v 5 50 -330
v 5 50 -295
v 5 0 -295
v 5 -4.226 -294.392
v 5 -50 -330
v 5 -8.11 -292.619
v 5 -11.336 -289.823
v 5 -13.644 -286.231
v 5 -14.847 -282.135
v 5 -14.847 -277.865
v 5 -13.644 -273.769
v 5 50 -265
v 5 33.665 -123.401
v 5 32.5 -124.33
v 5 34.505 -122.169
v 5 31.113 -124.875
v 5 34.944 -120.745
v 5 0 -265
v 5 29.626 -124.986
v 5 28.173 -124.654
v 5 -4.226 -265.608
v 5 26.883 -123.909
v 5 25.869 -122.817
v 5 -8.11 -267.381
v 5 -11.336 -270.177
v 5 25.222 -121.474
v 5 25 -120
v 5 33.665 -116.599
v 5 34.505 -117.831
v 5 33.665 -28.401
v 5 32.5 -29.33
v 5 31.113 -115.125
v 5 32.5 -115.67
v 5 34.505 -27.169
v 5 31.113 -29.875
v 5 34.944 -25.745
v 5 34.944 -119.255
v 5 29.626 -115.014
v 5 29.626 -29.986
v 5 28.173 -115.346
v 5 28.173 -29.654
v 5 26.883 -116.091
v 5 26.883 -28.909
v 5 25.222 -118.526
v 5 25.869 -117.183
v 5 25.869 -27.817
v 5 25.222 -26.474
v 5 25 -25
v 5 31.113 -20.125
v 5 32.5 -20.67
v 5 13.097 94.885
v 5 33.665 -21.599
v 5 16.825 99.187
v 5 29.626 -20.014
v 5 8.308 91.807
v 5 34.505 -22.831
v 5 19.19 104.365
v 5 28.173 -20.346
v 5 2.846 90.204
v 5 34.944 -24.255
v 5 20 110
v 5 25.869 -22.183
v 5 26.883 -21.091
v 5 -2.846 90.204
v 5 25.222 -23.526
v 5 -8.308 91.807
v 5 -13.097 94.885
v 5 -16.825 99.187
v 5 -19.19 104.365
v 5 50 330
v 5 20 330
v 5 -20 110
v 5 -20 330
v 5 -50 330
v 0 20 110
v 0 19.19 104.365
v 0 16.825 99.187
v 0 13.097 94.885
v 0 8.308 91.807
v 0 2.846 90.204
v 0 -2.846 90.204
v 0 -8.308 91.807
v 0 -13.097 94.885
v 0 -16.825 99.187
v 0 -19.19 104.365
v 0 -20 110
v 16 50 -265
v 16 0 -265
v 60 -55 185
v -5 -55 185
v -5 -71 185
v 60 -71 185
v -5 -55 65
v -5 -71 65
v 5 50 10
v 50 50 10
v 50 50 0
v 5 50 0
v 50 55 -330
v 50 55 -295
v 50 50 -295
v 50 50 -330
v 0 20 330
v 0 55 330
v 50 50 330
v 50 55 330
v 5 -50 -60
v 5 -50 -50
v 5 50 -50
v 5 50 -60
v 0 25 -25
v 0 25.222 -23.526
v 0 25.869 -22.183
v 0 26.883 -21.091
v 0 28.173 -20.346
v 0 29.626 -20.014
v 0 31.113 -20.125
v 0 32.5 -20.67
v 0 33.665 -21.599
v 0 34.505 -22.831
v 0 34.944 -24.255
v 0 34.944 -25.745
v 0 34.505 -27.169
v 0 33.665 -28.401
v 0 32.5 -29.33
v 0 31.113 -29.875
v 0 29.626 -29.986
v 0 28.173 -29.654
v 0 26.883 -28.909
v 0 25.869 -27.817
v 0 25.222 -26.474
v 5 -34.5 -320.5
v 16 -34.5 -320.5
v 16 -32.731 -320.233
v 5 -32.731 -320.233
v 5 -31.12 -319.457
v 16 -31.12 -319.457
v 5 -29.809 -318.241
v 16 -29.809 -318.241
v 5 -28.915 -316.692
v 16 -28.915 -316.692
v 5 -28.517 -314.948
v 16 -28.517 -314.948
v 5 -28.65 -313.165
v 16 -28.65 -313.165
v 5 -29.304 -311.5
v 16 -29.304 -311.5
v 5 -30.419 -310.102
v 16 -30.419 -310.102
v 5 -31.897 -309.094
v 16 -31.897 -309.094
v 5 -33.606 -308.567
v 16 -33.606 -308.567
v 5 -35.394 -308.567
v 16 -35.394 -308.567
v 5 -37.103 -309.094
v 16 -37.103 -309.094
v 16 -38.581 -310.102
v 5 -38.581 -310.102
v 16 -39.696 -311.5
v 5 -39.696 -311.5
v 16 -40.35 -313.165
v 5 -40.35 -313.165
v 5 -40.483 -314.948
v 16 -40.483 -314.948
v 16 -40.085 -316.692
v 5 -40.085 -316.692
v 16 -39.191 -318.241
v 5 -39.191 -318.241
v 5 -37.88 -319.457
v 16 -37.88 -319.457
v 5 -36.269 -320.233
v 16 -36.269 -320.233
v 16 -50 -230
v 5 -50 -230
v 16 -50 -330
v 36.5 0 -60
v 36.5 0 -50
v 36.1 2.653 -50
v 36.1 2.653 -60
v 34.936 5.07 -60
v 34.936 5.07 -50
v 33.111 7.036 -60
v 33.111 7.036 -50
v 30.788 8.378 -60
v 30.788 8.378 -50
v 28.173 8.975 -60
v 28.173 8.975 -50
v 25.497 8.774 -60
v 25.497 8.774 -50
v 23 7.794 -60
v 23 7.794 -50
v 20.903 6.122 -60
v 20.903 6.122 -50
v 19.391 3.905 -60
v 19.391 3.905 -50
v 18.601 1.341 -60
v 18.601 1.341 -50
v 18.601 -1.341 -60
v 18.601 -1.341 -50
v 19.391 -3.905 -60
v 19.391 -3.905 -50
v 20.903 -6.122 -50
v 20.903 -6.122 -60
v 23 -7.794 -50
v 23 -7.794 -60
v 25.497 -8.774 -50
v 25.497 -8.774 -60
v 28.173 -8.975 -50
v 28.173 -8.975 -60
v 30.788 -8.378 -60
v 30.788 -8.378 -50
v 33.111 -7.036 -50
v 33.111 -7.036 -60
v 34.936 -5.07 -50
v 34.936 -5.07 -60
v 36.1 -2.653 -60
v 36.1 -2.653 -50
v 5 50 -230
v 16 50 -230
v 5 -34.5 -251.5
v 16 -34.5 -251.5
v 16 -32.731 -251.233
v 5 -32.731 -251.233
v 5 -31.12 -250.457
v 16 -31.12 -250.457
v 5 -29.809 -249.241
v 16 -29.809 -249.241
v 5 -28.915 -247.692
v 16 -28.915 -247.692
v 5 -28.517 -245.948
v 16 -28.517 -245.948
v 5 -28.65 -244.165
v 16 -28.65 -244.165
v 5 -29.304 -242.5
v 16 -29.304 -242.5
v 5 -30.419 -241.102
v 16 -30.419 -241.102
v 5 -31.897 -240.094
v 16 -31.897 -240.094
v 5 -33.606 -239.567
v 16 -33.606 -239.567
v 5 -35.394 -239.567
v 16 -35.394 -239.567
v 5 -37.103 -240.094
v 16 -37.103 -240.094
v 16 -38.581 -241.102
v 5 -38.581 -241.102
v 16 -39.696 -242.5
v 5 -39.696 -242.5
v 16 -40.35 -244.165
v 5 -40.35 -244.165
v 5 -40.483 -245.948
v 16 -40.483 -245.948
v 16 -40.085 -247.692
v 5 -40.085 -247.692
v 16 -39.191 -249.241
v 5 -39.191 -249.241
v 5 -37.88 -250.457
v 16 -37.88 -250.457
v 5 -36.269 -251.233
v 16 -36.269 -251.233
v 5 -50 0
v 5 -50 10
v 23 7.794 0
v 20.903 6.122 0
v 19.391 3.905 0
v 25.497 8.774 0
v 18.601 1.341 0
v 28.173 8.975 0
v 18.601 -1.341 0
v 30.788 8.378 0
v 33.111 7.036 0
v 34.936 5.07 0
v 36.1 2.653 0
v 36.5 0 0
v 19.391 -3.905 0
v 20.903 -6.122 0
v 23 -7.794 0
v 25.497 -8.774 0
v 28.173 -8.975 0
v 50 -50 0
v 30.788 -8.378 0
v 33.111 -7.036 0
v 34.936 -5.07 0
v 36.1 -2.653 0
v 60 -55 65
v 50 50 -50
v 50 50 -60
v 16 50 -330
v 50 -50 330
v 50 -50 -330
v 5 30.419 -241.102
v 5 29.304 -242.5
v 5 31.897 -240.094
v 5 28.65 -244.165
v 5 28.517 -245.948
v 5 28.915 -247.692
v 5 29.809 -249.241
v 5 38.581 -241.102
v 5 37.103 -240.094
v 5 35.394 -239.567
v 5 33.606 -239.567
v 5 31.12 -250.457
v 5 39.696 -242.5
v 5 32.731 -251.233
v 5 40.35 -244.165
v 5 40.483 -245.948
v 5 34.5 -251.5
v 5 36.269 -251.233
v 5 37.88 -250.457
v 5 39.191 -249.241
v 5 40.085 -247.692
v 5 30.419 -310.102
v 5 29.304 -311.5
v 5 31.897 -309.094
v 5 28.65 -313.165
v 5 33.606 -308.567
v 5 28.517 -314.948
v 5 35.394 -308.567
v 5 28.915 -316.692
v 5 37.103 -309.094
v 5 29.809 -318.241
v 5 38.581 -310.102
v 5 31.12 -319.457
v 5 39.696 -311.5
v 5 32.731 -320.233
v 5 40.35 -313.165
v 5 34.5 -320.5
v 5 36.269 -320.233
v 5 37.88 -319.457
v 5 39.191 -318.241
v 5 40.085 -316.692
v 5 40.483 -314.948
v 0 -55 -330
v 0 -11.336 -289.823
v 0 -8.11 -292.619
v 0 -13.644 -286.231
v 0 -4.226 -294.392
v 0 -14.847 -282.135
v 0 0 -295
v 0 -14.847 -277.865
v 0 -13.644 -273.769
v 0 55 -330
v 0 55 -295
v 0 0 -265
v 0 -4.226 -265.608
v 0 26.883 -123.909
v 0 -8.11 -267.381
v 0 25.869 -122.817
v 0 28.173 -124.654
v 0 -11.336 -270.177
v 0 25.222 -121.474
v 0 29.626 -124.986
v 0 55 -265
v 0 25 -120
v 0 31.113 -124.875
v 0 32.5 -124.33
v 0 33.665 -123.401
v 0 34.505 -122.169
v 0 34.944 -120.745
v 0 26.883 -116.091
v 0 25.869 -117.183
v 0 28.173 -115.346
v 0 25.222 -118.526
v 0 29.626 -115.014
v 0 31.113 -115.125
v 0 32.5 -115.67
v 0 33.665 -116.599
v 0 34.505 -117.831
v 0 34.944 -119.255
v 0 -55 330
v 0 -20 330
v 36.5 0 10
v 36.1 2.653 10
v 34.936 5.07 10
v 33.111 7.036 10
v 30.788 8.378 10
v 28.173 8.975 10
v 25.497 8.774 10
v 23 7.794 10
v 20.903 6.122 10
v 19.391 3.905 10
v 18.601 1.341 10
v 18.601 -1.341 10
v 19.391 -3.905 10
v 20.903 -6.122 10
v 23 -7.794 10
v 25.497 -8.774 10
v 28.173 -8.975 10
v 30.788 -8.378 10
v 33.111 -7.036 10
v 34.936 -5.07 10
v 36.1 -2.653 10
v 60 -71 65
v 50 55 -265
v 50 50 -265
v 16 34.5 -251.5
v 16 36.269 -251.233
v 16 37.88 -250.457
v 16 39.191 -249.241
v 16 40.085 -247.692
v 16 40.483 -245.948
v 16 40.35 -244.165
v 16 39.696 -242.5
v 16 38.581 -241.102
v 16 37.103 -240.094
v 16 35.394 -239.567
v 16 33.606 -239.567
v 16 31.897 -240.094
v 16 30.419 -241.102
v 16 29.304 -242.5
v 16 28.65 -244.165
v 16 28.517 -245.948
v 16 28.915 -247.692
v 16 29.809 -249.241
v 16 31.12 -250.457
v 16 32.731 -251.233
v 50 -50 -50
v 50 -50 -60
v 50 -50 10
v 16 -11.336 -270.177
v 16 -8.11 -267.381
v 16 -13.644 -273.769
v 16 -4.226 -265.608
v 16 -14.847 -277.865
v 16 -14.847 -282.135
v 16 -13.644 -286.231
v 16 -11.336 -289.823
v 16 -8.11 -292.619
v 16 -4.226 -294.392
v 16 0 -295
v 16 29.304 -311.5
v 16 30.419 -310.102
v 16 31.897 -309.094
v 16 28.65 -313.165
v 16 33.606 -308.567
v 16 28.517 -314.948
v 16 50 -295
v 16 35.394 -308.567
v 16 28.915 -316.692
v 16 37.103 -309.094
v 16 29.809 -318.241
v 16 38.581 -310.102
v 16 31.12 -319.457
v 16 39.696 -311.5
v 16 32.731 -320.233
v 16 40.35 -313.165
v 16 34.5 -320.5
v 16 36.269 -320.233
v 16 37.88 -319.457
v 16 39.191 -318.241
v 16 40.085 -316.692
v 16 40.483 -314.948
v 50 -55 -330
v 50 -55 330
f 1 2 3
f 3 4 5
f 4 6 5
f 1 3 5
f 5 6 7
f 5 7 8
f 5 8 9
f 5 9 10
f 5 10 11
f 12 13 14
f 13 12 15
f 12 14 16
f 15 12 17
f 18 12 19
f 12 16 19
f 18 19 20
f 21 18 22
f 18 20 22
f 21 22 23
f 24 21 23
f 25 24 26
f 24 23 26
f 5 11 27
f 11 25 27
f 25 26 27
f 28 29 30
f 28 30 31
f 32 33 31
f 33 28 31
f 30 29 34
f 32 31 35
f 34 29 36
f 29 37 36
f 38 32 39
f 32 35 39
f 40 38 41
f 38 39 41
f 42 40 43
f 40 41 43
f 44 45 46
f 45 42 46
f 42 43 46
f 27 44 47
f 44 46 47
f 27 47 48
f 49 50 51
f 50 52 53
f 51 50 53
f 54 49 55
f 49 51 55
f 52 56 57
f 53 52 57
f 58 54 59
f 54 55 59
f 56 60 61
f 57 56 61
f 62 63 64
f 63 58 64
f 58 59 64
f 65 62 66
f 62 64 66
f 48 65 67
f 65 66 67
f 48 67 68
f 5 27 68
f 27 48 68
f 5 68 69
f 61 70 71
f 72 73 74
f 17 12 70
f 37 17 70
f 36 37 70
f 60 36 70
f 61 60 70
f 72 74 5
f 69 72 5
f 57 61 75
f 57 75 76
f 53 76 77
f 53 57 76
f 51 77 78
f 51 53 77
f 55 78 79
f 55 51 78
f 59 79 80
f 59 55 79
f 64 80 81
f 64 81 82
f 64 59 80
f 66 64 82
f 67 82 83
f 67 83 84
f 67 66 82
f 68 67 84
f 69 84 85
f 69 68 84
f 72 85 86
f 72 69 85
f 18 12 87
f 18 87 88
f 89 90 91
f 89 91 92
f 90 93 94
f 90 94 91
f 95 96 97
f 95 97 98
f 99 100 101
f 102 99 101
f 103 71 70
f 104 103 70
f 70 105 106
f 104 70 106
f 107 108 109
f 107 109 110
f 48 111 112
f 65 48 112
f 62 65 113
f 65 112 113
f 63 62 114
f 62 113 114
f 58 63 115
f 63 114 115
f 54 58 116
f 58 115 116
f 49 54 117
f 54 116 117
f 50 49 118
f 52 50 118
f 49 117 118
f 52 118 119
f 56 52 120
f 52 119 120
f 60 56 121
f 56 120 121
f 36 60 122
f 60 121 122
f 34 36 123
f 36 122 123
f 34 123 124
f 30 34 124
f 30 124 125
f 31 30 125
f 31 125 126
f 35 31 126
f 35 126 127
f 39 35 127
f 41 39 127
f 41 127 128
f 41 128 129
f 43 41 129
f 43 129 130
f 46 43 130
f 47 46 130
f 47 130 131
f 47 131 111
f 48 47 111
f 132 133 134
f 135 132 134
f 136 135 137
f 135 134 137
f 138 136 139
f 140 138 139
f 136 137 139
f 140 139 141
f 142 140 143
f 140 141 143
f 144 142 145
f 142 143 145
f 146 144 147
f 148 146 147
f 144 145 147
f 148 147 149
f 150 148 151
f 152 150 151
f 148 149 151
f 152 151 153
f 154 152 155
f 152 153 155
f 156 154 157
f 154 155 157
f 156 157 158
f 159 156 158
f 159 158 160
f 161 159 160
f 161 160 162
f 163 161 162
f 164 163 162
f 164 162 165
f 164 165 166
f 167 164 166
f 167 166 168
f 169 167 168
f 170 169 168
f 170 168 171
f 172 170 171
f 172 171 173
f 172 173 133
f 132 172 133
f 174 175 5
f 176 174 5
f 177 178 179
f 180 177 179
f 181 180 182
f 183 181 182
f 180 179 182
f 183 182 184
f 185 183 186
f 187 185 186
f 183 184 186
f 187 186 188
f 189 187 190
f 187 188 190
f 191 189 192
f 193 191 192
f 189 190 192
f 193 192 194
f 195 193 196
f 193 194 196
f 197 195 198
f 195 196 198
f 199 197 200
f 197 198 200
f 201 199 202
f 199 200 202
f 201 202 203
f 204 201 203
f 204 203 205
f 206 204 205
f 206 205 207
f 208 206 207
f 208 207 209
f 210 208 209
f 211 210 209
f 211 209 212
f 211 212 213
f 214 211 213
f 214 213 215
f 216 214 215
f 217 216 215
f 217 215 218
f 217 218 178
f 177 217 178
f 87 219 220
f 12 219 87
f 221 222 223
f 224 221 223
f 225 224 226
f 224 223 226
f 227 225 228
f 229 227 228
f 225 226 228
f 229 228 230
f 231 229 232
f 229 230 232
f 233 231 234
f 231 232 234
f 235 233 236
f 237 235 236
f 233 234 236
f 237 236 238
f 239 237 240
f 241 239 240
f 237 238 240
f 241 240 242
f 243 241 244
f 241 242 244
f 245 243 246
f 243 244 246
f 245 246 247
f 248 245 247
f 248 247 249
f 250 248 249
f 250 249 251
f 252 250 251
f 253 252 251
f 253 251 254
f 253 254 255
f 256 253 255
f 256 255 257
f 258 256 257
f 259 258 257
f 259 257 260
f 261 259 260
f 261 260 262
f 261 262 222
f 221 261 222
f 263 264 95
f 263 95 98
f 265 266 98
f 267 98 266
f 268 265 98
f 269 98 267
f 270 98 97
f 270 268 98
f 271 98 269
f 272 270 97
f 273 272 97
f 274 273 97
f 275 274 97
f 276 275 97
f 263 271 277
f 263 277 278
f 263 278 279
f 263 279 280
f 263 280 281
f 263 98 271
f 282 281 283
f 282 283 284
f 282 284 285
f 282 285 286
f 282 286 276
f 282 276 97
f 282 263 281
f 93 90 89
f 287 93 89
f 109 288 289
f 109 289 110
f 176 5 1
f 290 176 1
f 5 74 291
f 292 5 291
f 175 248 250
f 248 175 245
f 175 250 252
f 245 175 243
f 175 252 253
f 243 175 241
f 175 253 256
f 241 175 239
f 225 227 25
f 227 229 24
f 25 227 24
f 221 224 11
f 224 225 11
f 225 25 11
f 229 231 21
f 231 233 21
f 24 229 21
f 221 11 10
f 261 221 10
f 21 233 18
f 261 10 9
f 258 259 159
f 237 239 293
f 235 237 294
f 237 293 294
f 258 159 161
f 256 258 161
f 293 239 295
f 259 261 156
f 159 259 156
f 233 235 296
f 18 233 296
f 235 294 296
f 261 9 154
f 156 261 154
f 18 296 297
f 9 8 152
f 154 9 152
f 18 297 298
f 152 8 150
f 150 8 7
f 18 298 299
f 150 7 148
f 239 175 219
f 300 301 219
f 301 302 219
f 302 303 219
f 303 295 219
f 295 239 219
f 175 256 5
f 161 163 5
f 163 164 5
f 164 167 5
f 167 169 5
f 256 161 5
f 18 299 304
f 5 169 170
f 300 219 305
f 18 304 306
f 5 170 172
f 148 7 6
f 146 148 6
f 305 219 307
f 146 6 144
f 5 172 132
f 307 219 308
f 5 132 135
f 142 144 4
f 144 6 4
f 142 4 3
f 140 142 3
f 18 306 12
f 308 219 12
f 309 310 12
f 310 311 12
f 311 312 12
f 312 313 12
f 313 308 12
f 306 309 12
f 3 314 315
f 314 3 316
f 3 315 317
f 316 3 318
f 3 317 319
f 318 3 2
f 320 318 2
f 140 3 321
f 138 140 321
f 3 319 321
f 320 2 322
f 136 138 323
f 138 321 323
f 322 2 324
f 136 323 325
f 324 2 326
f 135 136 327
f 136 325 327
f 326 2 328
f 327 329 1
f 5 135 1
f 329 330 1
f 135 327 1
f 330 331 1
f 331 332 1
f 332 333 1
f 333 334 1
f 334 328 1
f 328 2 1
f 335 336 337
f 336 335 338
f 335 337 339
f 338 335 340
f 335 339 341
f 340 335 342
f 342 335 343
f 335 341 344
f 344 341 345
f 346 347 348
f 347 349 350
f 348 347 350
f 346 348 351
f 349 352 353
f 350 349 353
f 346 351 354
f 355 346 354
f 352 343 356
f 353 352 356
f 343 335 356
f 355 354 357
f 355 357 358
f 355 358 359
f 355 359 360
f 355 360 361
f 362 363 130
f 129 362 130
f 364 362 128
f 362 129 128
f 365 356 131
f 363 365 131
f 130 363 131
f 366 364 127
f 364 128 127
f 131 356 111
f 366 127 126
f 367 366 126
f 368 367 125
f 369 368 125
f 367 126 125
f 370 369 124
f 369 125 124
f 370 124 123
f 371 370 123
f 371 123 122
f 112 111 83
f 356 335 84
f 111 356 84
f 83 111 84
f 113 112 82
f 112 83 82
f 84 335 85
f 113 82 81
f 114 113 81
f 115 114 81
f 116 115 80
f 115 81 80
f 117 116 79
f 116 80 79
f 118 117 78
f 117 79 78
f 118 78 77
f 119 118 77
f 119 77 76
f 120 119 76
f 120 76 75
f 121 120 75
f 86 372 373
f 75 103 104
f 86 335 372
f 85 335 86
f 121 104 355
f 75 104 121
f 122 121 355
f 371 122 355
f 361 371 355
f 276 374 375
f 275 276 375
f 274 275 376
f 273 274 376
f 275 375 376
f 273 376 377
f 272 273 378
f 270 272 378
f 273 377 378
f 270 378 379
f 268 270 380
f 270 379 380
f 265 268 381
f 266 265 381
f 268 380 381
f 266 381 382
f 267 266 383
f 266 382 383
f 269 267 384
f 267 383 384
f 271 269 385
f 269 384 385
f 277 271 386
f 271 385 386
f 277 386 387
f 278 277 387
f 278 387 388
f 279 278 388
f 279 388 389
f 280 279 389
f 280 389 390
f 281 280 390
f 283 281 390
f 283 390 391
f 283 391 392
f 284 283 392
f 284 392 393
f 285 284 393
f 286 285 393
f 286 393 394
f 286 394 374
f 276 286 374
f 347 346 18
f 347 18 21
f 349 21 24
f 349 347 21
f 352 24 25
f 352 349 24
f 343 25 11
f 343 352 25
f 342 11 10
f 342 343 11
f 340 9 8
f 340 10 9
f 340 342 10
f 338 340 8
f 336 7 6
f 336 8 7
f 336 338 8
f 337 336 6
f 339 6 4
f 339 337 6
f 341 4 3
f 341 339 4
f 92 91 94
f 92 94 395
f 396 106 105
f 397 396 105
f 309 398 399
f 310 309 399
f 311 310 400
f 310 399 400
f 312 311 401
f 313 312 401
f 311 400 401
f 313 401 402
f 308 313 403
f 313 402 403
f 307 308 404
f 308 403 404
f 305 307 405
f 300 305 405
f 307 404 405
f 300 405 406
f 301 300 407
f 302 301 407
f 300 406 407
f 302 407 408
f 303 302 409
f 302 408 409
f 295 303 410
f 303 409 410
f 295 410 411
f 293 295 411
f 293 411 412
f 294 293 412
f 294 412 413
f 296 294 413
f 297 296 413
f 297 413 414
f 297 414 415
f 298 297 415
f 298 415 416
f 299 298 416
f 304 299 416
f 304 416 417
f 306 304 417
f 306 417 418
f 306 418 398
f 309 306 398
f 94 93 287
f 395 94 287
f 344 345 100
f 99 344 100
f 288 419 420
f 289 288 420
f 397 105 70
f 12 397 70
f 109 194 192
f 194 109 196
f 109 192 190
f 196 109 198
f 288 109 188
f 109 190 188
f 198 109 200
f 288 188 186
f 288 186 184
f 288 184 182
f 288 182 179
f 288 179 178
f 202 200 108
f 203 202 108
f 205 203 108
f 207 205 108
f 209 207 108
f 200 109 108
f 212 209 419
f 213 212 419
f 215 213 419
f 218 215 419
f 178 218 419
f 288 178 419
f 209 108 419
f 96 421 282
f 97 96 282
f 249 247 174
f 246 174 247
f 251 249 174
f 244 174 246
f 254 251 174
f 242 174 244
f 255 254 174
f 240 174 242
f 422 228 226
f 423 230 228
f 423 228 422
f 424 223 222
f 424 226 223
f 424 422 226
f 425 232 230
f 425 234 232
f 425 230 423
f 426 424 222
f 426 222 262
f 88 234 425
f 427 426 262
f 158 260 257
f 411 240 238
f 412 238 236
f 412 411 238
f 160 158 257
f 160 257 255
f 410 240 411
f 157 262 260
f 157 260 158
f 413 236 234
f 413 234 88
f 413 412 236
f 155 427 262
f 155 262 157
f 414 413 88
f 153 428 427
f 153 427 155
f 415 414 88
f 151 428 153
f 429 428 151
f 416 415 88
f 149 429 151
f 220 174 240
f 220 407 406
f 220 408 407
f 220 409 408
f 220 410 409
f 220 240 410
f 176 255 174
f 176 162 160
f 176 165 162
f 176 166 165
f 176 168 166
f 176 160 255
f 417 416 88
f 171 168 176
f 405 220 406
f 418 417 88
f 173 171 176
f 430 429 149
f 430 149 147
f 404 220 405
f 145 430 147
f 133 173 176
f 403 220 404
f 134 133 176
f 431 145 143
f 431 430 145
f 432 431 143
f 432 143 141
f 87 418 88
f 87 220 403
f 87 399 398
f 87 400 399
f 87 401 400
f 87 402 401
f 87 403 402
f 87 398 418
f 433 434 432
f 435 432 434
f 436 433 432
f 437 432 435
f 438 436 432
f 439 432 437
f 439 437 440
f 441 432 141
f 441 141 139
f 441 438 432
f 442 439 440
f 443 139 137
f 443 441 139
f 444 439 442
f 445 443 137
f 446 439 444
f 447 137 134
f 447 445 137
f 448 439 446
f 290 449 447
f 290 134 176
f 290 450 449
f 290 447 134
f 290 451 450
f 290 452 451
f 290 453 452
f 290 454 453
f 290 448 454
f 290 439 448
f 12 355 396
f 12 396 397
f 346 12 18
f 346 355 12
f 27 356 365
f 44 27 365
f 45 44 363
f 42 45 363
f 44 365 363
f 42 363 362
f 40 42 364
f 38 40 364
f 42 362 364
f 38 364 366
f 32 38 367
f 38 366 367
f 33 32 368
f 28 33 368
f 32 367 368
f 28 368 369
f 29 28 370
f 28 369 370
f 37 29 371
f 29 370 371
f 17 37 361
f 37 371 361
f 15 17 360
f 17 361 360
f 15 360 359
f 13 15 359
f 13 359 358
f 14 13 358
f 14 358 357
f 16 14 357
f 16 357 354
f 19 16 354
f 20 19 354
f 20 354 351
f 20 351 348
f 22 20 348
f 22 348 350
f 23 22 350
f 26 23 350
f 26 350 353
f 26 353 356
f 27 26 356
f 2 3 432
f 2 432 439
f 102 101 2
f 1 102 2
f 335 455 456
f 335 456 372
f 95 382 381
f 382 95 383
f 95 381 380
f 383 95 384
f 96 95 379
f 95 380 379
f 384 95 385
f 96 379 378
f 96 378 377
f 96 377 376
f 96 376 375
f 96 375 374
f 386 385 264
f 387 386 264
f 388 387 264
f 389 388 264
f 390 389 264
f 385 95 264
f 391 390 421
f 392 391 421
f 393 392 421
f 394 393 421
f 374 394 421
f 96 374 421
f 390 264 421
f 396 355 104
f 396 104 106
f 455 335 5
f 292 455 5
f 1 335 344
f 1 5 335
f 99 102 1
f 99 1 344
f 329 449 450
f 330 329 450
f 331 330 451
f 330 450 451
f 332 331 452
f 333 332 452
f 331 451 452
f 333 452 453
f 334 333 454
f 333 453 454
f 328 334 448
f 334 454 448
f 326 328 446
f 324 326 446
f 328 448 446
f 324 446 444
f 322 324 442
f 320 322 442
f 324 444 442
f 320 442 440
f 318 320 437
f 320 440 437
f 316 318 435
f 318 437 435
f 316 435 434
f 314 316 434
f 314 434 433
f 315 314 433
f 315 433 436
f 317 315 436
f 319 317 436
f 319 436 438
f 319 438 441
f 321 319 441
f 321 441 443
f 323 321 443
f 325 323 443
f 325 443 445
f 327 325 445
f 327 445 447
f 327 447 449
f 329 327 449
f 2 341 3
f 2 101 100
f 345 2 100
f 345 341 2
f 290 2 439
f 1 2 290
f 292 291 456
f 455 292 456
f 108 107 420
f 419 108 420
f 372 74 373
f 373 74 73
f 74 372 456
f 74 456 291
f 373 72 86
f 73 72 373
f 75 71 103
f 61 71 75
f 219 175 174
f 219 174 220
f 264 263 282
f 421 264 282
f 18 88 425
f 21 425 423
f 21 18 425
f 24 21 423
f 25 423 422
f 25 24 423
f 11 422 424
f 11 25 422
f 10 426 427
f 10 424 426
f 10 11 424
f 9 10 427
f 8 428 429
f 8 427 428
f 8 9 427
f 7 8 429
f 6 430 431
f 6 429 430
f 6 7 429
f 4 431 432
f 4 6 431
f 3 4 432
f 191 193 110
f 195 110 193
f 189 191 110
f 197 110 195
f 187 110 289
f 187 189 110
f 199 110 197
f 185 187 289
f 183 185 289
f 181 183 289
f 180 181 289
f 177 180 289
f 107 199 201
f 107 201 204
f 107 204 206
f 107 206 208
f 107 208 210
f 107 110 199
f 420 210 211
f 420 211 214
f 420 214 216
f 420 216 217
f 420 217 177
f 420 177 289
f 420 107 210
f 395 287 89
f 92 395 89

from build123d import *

# Parameters (mm, degrees)
C_CHANNEL_100_X_10_1_DEPTH = 660
BOSS_EXTRUDE1_REACH        = 351.893
SKETCH12_W                 = 45
SKETCH12_H                 = 10
CUT_EXTRUDE1_DEPTH         = 5
SKETCH17_W                 = 100
SKETCH17_H                 = 100
BOSS_EXTRUDE3_DEPTH        = 11
SKETCH15_W                 = 65
SKETCH15_H                 = 120
BOSS_EXTRUDE2_DEPTH        = 16
CUT_EXTRUDE2_DEPTH         = 343.002923964
CUT_EXTRUDE2_DEPTH_BACK    = 343.002923964
SKETCH19_R                 = 6
CUT_EXTRUDE4_DEPTH         = 25
SKETCH20_R                 = 5
CUT_EXTRUDE5_DEPTH         = 343.84252945
CUT_EXTRUDE7_REACH         = 354.478
SKETCH22_R                 = 9


with BuildPart() as part:
    # Sketch11 → C channel 100 X 10(1) (new body)
    with BuildSketch(Plane.YX.offset(-330)):
        Polygon((-55, 0), (55, 0), (55, 50), (50, 50), (50, 5), (-50, 5), (-50, 50), (-55, 50), align=None)
    extrude(amount=C_CHANNEL_100_X_10_1_DEPTH)


with BuildPart() as body_2:

    # Sketch12 → Boss-Extrude1 (new, up to next)
    with BuildSketch(Plane(origin=(0, -50, 0), x_dir=(1, 0, 0), z_dir=(0, 1, 0)), mode=Mode.PRIVATE) as boss_extrude1_sk1:
        with Locations((27.5, -5)):
            Rectangle(SKETCH12_W, SKETCH12_H)
    boss_extrude1_tool1 = extrude(boss_extrude1_sk1.sketch, amount=BOSS_EXTRUDE1_REACH, mode=Mode.PRIVATE) - part.part
    # Sketch12 → Boss-Extrude1 (new, up to next)
    with BuildSketch(Plane(origin=(0, -50, 0), x_dir=(1, 0, 0), z_dir=(0, 1, 0)), mode=Mode.PRIVATE) as boss_extrude1_sk2:
        with Locations((27.5, 55)):
            Rectangle(SKETCH12_W, SKETCH12_H)
    boss_extrude1_tool2 = extrude(boss_extrude1_sk2.sketch, amount=BOSS_EXTRUDE1_REACH, mode=Mode.PRIVATE) - part.part
    add(boss_extrude1_tool1.solids().sort_by_distance((27.5, -50, 5))[0])
    add(boss_extrude1_tool2.solids().sort_by_distance((27.5, -50, -55))[0])

    # Cut-Extrude7: up to this face of the body (flat: up to its plane)
    cut_extrude7_end = Plane(body_2.part.faces().sort_by_distance((27.5, 0, -60))[0])
    # Sketch22 → Cut-Extrude7 (cut, up to the picked face)
    with BuildSketch(Plane.XY.offset(10), mode=Mode.PRIVATE) as cut_extrude7_sk1:
        with Locations((27.5, 0)):
            Circle(SKETCH22_R)
    cut_extrude7_tool1 = split(extrude(cut_extrude7_sk1.sketch, amount=-CUT_EXTRUDE7_REACH, mode=Mode.PRIVATE), bisect_by=cut_extrude7_end, keep=Keep.BOTH, mode=Mode.PRIVATE)
    add(cut_extrude7_tool1.solids().sort_by(Axis((27.5, 0, 10), (0, 0, -1)))[0], mode=Mode.SUBTRACT)


with BuildPart() as part_1:
    add(part.part)

    # Sketch13 → Cut-Extrude1 (cut)
    with BuildSketch(Plane(origin=(5, 0, 0), x_dir=(0, 0, -1), z_dir=(1, 0, 0))):
        with BuildLine():
            Line((-330, 20), (-110, 20))
            ThreePointArc((-110, 20), (-90, 0), (-110, -20))
            Line((-110, -20), (-330, -20))
            Line((-330, -20), (-330, 20))
        make_face()
    extrude(amount=-CUT_EXTRUDE1_DEPTH, mode=Mode.SUBTRACT)


with BuildPart() as body_3:
    # Sketch17 → Boss-Extrude3 (new body)
    with BuildSketch(Plane(origin=(5, 0, 0), x_dir=(0, 0, -1), z_dir=(1, 0, 0))):
        with Locations((280, 0)):
            Rectangle(SKETCH17_W, SKETCH17_H)
    extrude(amount=BOSS_EXTRUDE3_DEPTH)


with BuildPart() as body_4:
    # Sketch15 → Boss-Extrude2 (new body)
    with BuildSketch(Plane.XZ.offset(55)):
        with Locations((27.5, 125)):
            Rectangle(SKETCH15_W, SKETCH15_H)
    extrude(amount=BOSS_EXTRUDE2_DEPTH)


with BuildPart() as cut_extrude2_tool:
    # Sketch14 → Cut-Extrude2 (new, two sides: drawn at the far end of the back side and taken through both)
    with BuildSketch(Plane(origin=(5, 0, 0), x_dir=(0, 0, -1), z_dir=(1, 0, 0)).offset(-CUT_EXTRUDE2_DEPTH_BACK)):
        with BuildLine():
            Line((265, 55), (265, 0))
            ThreePointArc((265, 0), (280, -15), (295, 0))
            Line((295, 0), (295, 55))
            Line((295, 55), (265, 55))
        make_face()
    extrude(amount=CUT_EXTRUDE2_DEPTH + CUT_EXTRUDE2_DEPTH_BACK)


with BuildPart() as part_2:
    add(part_1.part)

    # Cut-Extrude2: cut by cut_extrude2_tool
    add(cut_extrude2_tool.part, mode=Mode.SUBTRACT)

    # Sketch20 → Cut-Extrude5 (cut, through all)
    with BuildSketch(Plane.ZY):
        with Locations(Location((-25, 30, 0), (0, 0, 270))):
            Circle(SKETCH20_R)
        with Locations(Location((-120, 30, 0), (0, 0, 270))):
            Circle(SKETCH20_R)
    extrude(amount=-CUT_EXTRUDE5_DEPTH, mode=Mode.SUBTRACT)


with BuildPart() as body_3_1:
    add(body_3.part)

    # Cut-Extrude2: cut by cut_extrude2_tool
    add(cut_extrude2_tool.part, mode=Mode.SUBTRACT)

    # Sketch19 → Cut-Extrude4 (cut)
    with BuildSketch(Plane(origin=(30, 0, 0), x_dir=(0, 0, -1), z_dir=(1, 0, 0))):
        with Locations((314.5, -34.5)):
            Circle(SKETCH19_R)
        with Locations((245.5, -34.5)):
            Circle(SKETCH19_R)
        with Locations((314.5, 34.5)):
            Circle(SKETCH19_R)
        with Locations((245.5, 34.5)):
            Circle(SKETCH19_R)
    extrude(amount=-CUT_EXTRUDE4_DEPTH, mode=Mode.SUBTRACT)


solid = Compound([body_2.part, body_4.part, part_2.part, body_3_1.part])
